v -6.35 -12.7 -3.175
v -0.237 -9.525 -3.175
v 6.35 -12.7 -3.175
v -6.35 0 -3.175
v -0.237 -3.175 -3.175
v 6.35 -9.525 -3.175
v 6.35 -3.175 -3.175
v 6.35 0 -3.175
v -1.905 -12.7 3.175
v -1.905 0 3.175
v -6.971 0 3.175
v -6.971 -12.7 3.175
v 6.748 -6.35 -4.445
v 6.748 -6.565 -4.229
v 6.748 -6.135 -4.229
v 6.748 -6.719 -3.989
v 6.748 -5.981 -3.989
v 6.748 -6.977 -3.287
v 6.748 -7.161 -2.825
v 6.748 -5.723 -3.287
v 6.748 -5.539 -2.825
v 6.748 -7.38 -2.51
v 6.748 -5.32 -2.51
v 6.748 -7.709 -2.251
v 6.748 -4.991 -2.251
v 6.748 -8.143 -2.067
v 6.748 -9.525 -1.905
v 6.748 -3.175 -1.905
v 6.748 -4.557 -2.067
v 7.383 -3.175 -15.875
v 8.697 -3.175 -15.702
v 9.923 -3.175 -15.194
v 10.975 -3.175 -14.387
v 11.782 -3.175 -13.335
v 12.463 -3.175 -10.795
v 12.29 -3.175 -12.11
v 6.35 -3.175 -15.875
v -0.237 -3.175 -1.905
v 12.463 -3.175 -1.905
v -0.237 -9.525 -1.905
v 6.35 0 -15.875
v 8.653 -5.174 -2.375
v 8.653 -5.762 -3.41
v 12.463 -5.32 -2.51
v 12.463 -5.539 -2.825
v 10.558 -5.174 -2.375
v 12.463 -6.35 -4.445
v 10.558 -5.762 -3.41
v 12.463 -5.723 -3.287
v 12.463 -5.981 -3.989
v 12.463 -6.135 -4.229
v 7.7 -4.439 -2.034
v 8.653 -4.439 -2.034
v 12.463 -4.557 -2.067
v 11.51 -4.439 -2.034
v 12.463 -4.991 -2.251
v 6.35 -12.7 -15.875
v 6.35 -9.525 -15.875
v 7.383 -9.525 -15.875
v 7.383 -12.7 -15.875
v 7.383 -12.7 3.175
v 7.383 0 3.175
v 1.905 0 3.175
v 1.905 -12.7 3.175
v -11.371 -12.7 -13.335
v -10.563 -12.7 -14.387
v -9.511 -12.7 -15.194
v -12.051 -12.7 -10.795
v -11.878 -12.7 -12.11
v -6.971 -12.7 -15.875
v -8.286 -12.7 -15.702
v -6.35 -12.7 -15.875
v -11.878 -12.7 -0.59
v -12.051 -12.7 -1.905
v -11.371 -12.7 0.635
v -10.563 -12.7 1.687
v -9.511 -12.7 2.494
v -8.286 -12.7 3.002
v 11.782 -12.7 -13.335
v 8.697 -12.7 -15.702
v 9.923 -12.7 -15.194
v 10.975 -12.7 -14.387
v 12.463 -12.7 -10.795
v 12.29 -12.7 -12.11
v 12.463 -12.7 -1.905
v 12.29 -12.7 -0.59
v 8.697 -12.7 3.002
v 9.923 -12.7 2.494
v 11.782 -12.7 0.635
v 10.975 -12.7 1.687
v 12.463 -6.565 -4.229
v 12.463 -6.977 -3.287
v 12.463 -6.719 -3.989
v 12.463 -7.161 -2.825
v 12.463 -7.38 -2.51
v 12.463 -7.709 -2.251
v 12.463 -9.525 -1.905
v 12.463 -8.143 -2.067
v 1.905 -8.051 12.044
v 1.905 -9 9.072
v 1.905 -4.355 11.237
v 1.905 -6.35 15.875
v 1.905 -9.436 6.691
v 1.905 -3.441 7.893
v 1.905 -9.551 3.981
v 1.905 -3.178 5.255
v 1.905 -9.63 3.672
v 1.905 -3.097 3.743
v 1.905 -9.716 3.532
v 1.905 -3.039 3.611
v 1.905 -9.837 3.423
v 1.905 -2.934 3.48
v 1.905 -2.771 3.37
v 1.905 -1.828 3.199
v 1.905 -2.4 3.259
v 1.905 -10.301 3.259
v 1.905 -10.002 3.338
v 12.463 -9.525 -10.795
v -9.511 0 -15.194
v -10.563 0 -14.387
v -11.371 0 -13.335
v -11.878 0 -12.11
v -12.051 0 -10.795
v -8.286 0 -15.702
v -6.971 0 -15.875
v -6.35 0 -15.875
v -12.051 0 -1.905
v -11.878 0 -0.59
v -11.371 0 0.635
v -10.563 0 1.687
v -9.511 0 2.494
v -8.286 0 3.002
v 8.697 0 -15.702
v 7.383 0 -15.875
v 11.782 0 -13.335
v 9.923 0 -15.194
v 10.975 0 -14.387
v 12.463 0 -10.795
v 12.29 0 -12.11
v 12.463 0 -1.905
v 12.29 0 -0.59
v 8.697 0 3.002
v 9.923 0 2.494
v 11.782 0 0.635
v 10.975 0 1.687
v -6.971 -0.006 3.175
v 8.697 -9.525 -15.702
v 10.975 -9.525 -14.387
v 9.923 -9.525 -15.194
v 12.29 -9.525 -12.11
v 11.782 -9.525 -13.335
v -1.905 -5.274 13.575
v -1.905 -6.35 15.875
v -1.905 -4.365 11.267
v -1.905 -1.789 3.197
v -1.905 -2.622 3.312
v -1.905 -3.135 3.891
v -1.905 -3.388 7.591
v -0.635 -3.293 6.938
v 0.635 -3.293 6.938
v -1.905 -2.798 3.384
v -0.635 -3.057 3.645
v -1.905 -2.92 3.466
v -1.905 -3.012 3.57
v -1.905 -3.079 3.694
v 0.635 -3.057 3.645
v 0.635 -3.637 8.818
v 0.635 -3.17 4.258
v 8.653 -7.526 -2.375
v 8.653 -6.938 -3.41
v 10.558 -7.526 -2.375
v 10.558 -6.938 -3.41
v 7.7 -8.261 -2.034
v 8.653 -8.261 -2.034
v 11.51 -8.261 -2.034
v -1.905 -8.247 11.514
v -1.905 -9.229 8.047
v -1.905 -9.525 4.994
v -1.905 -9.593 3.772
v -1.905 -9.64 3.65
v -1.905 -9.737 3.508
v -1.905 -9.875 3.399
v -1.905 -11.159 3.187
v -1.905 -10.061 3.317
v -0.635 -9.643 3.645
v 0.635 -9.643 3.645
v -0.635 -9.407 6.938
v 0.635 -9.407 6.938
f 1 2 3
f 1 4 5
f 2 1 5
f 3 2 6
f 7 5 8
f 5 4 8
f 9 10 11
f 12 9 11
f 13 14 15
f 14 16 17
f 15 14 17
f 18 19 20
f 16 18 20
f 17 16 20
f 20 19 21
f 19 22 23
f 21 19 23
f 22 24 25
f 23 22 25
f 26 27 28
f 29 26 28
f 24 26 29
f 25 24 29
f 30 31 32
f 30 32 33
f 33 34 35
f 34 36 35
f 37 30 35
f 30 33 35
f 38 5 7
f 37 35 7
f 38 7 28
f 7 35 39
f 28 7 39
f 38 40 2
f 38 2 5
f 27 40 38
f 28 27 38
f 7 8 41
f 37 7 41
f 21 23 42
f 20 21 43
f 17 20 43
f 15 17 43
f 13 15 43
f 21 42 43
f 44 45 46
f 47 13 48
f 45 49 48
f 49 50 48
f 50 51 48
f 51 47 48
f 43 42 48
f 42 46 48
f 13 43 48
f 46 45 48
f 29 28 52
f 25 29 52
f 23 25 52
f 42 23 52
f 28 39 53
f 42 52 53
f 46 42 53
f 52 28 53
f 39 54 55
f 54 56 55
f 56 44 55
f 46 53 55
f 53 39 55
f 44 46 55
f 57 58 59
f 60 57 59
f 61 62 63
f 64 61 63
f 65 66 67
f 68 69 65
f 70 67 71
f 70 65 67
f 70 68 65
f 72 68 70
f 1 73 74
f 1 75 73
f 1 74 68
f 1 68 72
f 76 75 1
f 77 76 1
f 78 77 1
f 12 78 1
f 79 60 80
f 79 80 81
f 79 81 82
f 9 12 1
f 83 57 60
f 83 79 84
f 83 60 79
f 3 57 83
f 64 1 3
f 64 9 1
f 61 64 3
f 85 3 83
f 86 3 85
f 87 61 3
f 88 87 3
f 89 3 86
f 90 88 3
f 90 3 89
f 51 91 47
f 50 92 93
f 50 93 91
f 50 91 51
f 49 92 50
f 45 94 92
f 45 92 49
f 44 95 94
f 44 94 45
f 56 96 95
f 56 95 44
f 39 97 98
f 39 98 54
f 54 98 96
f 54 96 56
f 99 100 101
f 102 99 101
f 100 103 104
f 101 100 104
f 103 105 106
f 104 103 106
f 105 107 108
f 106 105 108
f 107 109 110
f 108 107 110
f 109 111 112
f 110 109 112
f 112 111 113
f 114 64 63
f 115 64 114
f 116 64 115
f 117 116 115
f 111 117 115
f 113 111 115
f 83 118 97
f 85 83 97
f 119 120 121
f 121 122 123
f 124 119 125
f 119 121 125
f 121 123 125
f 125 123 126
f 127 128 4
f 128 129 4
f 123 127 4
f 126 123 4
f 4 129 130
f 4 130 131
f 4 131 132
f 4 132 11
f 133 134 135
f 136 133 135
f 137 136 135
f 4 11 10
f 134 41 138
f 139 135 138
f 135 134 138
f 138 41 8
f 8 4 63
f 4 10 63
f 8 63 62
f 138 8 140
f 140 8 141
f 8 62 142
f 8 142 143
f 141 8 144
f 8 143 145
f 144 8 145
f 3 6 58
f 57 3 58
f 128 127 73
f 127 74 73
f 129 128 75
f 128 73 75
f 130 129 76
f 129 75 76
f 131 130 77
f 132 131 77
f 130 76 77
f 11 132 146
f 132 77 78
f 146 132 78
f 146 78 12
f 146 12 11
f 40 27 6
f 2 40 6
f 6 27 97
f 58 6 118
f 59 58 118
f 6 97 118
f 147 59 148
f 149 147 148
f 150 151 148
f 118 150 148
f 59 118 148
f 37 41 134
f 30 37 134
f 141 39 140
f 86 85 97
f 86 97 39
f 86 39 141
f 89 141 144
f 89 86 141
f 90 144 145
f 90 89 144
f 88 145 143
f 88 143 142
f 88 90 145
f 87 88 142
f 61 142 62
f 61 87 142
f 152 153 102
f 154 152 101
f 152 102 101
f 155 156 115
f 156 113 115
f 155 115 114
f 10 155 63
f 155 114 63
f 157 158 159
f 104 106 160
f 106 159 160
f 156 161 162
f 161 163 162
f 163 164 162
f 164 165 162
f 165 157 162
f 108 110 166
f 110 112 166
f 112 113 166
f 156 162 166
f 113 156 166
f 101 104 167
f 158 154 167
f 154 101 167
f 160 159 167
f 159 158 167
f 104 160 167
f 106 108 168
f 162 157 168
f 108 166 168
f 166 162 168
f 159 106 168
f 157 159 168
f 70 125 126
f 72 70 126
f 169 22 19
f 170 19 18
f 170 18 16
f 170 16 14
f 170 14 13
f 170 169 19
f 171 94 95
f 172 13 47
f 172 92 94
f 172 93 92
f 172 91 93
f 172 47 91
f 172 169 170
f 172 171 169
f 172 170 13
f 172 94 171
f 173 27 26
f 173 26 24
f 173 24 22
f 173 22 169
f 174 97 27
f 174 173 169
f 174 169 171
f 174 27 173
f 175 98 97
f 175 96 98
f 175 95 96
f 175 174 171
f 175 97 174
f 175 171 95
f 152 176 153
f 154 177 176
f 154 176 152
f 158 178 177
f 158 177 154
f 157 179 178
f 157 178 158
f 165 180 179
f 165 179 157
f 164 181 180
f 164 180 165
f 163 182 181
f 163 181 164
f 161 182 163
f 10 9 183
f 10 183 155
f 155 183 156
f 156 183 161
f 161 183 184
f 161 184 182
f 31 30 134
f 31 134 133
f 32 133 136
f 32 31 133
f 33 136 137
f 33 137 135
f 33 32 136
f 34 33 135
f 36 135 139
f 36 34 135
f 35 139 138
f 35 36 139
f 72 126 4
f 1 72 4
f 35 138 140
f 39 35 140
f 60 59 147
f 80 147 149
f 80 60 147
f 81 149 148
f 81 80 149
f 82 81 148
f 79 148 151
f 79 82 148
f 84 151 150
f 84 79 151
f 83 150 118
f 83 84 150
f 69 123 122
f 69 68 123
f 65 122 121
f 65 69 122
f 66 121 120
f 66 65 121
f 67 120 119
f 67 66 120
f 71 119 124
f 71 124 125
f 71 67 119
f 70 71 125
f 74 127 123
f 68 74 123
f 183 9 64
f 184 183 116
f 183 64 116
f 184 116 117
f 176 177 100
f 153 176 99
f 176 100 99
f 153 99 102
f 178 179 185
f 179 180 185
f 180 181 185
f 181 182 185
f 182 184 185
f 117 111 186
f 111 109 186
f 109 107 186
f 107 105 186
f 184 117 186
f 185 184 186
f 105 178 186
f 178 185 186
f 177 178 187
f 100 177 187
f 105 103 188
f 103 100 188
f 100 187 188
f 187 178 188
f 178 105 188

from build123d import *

# Parameters (mm, degrees)
F0_W      = 12.7
F0_H      = 6.35
F1_DEPTH  = 12.7
F2_R      = 5.08
F3_W      = 6.35
F3_H      = 8.89
F4_DEPTH  = 12.7
F6_DEPTH  = 5.715
F7_W      = 3.81
F7_H      = 12.7
F8_DEPTH  = 12.7
F10_DEPTH = 25.4


with BuildPart() as f1:
    # F0 (on Front) → F1 (new body)
    with BuildSketch(Plane.XZ):
        Polygon((-6.35, -3.175), (-6.35, 3.175), (-12.0512209833, 3.175), (-12.0512209833, -15.875), (-6.35, -15.875), align=None)
        Rectangle(F0_W, F0_H)
        Polygon((12.4626047909, 3.175), (6.35, 3.175), (6.35, -3.175), (6.35, -15.875), (12.4626047909, -15.875), align=None)
    extrude(amount=F1_DEPTH)

    # F2
    f2_edges = [f1.edges().sort_by_distance(p)[0] for p in [
        (-12.051221, -6.35, 3.175),
        (12.462605, -6.35, 3.175),
        (-12.051221, -6.35, -15.875),
        (12.462605, -6.35, -15.875),
    ]]
    fillet(f2_edges, radius=F2_R)

    # F3 (on face) → F4 (cut)
    with BuildSketch(Plane.YZ.offset(12.4626047909)):
        with Locations((-6.35, -6.35)):
            Rectangle(F3_W, F3_H)
        with Locations((-6.35, -15.24)):
            Rectangle(F3_W, F3_H)
    extrude(amount=-F4_DEPTH, mode=Mode.SUBTRACT)

    # F5 (on face) → F6 (join)
    with BuildSketch(Plane.YZ.offset(12.4626047909)):
        with BuildLine():
            Line((-6.35, -4.445), (-6.35, -1.905))
            Line((-6.35, -1.905), (-9.525, -1.905))
            add(Edge.make_bspline(
                [(-9.525, -1.905), (-6.35, -1.905), (-7.4083333333, -3.5983333333), (-6.35, -4.445)],
                knots=[0, 0, 0, 0, 4.0659838908, 4.0659838908, 4.0659838908, 4.0659838908], degree=3))
        make_face()
        with BuildLine():
            add(Edge.make_bspline(
                [(-3.175, -1.905), (-6.35, -1.905), (-5.2916666667, -3.5983333333), (-6.35, -4.445)],
                knots=[0, 0, 0, 0, 4.0659838908, 4.0659838908, 4.0659838908, 4.0659838908], degree=3))
            Line((-3.175, -1.905), (-6.35, -1.905))
            Line((-6.35, -1.905), (-6.35, -4.445))
        make_face()
    extrude(amount=-F6_DEPTH)

    # F7 (on face) → F8 (join)
    with BuildSketch(Plane.XY.offset(3.175)):
        with Locations((0, -6.35)):
            Rectangle(F7_W, F7_H)
    extrude(amount=F8_DEPTH)

    # F9 (on face) → F10 (cut)
    with BuildSketch(Plane.YZ.offset(1.905)):
        with BuildLine():
            Line((-12.7, 15.875), (-12.7, 3.175))
            add(Edge.make_bspline(
                [(-12.7, 3.175), (-6.35, 3.175), (-12.7, 3.175), (-6.35, 15.875)],
                knots=[0, 0, 0, 0, 14.1990316571, 14.1990316571, 14.1990316571, 14.1990316571], degree=3))
            Line((-6.35, 15.875), (-12.7, 15.875))
        make_face()
        with BuildLine():
            Line((0, 15.875), (-6.35, 15.875))
            add(Edge.make_bspline(
                [(-6.35, 15.875), (0, 3.175), (-6.35, 3.175), (0, 3.175)],
                knots=[0, 0, 0, 0, 14.1990316571, 14.1990316571, 14.1990316571, 14.1990316571], degree=3))
            Line((0, 3.175), (0, 15.875))
        make_face()
    extrude(amount=-F10_DEPTH, mode=Mode.SUBTRACT)


solid = f1.part
